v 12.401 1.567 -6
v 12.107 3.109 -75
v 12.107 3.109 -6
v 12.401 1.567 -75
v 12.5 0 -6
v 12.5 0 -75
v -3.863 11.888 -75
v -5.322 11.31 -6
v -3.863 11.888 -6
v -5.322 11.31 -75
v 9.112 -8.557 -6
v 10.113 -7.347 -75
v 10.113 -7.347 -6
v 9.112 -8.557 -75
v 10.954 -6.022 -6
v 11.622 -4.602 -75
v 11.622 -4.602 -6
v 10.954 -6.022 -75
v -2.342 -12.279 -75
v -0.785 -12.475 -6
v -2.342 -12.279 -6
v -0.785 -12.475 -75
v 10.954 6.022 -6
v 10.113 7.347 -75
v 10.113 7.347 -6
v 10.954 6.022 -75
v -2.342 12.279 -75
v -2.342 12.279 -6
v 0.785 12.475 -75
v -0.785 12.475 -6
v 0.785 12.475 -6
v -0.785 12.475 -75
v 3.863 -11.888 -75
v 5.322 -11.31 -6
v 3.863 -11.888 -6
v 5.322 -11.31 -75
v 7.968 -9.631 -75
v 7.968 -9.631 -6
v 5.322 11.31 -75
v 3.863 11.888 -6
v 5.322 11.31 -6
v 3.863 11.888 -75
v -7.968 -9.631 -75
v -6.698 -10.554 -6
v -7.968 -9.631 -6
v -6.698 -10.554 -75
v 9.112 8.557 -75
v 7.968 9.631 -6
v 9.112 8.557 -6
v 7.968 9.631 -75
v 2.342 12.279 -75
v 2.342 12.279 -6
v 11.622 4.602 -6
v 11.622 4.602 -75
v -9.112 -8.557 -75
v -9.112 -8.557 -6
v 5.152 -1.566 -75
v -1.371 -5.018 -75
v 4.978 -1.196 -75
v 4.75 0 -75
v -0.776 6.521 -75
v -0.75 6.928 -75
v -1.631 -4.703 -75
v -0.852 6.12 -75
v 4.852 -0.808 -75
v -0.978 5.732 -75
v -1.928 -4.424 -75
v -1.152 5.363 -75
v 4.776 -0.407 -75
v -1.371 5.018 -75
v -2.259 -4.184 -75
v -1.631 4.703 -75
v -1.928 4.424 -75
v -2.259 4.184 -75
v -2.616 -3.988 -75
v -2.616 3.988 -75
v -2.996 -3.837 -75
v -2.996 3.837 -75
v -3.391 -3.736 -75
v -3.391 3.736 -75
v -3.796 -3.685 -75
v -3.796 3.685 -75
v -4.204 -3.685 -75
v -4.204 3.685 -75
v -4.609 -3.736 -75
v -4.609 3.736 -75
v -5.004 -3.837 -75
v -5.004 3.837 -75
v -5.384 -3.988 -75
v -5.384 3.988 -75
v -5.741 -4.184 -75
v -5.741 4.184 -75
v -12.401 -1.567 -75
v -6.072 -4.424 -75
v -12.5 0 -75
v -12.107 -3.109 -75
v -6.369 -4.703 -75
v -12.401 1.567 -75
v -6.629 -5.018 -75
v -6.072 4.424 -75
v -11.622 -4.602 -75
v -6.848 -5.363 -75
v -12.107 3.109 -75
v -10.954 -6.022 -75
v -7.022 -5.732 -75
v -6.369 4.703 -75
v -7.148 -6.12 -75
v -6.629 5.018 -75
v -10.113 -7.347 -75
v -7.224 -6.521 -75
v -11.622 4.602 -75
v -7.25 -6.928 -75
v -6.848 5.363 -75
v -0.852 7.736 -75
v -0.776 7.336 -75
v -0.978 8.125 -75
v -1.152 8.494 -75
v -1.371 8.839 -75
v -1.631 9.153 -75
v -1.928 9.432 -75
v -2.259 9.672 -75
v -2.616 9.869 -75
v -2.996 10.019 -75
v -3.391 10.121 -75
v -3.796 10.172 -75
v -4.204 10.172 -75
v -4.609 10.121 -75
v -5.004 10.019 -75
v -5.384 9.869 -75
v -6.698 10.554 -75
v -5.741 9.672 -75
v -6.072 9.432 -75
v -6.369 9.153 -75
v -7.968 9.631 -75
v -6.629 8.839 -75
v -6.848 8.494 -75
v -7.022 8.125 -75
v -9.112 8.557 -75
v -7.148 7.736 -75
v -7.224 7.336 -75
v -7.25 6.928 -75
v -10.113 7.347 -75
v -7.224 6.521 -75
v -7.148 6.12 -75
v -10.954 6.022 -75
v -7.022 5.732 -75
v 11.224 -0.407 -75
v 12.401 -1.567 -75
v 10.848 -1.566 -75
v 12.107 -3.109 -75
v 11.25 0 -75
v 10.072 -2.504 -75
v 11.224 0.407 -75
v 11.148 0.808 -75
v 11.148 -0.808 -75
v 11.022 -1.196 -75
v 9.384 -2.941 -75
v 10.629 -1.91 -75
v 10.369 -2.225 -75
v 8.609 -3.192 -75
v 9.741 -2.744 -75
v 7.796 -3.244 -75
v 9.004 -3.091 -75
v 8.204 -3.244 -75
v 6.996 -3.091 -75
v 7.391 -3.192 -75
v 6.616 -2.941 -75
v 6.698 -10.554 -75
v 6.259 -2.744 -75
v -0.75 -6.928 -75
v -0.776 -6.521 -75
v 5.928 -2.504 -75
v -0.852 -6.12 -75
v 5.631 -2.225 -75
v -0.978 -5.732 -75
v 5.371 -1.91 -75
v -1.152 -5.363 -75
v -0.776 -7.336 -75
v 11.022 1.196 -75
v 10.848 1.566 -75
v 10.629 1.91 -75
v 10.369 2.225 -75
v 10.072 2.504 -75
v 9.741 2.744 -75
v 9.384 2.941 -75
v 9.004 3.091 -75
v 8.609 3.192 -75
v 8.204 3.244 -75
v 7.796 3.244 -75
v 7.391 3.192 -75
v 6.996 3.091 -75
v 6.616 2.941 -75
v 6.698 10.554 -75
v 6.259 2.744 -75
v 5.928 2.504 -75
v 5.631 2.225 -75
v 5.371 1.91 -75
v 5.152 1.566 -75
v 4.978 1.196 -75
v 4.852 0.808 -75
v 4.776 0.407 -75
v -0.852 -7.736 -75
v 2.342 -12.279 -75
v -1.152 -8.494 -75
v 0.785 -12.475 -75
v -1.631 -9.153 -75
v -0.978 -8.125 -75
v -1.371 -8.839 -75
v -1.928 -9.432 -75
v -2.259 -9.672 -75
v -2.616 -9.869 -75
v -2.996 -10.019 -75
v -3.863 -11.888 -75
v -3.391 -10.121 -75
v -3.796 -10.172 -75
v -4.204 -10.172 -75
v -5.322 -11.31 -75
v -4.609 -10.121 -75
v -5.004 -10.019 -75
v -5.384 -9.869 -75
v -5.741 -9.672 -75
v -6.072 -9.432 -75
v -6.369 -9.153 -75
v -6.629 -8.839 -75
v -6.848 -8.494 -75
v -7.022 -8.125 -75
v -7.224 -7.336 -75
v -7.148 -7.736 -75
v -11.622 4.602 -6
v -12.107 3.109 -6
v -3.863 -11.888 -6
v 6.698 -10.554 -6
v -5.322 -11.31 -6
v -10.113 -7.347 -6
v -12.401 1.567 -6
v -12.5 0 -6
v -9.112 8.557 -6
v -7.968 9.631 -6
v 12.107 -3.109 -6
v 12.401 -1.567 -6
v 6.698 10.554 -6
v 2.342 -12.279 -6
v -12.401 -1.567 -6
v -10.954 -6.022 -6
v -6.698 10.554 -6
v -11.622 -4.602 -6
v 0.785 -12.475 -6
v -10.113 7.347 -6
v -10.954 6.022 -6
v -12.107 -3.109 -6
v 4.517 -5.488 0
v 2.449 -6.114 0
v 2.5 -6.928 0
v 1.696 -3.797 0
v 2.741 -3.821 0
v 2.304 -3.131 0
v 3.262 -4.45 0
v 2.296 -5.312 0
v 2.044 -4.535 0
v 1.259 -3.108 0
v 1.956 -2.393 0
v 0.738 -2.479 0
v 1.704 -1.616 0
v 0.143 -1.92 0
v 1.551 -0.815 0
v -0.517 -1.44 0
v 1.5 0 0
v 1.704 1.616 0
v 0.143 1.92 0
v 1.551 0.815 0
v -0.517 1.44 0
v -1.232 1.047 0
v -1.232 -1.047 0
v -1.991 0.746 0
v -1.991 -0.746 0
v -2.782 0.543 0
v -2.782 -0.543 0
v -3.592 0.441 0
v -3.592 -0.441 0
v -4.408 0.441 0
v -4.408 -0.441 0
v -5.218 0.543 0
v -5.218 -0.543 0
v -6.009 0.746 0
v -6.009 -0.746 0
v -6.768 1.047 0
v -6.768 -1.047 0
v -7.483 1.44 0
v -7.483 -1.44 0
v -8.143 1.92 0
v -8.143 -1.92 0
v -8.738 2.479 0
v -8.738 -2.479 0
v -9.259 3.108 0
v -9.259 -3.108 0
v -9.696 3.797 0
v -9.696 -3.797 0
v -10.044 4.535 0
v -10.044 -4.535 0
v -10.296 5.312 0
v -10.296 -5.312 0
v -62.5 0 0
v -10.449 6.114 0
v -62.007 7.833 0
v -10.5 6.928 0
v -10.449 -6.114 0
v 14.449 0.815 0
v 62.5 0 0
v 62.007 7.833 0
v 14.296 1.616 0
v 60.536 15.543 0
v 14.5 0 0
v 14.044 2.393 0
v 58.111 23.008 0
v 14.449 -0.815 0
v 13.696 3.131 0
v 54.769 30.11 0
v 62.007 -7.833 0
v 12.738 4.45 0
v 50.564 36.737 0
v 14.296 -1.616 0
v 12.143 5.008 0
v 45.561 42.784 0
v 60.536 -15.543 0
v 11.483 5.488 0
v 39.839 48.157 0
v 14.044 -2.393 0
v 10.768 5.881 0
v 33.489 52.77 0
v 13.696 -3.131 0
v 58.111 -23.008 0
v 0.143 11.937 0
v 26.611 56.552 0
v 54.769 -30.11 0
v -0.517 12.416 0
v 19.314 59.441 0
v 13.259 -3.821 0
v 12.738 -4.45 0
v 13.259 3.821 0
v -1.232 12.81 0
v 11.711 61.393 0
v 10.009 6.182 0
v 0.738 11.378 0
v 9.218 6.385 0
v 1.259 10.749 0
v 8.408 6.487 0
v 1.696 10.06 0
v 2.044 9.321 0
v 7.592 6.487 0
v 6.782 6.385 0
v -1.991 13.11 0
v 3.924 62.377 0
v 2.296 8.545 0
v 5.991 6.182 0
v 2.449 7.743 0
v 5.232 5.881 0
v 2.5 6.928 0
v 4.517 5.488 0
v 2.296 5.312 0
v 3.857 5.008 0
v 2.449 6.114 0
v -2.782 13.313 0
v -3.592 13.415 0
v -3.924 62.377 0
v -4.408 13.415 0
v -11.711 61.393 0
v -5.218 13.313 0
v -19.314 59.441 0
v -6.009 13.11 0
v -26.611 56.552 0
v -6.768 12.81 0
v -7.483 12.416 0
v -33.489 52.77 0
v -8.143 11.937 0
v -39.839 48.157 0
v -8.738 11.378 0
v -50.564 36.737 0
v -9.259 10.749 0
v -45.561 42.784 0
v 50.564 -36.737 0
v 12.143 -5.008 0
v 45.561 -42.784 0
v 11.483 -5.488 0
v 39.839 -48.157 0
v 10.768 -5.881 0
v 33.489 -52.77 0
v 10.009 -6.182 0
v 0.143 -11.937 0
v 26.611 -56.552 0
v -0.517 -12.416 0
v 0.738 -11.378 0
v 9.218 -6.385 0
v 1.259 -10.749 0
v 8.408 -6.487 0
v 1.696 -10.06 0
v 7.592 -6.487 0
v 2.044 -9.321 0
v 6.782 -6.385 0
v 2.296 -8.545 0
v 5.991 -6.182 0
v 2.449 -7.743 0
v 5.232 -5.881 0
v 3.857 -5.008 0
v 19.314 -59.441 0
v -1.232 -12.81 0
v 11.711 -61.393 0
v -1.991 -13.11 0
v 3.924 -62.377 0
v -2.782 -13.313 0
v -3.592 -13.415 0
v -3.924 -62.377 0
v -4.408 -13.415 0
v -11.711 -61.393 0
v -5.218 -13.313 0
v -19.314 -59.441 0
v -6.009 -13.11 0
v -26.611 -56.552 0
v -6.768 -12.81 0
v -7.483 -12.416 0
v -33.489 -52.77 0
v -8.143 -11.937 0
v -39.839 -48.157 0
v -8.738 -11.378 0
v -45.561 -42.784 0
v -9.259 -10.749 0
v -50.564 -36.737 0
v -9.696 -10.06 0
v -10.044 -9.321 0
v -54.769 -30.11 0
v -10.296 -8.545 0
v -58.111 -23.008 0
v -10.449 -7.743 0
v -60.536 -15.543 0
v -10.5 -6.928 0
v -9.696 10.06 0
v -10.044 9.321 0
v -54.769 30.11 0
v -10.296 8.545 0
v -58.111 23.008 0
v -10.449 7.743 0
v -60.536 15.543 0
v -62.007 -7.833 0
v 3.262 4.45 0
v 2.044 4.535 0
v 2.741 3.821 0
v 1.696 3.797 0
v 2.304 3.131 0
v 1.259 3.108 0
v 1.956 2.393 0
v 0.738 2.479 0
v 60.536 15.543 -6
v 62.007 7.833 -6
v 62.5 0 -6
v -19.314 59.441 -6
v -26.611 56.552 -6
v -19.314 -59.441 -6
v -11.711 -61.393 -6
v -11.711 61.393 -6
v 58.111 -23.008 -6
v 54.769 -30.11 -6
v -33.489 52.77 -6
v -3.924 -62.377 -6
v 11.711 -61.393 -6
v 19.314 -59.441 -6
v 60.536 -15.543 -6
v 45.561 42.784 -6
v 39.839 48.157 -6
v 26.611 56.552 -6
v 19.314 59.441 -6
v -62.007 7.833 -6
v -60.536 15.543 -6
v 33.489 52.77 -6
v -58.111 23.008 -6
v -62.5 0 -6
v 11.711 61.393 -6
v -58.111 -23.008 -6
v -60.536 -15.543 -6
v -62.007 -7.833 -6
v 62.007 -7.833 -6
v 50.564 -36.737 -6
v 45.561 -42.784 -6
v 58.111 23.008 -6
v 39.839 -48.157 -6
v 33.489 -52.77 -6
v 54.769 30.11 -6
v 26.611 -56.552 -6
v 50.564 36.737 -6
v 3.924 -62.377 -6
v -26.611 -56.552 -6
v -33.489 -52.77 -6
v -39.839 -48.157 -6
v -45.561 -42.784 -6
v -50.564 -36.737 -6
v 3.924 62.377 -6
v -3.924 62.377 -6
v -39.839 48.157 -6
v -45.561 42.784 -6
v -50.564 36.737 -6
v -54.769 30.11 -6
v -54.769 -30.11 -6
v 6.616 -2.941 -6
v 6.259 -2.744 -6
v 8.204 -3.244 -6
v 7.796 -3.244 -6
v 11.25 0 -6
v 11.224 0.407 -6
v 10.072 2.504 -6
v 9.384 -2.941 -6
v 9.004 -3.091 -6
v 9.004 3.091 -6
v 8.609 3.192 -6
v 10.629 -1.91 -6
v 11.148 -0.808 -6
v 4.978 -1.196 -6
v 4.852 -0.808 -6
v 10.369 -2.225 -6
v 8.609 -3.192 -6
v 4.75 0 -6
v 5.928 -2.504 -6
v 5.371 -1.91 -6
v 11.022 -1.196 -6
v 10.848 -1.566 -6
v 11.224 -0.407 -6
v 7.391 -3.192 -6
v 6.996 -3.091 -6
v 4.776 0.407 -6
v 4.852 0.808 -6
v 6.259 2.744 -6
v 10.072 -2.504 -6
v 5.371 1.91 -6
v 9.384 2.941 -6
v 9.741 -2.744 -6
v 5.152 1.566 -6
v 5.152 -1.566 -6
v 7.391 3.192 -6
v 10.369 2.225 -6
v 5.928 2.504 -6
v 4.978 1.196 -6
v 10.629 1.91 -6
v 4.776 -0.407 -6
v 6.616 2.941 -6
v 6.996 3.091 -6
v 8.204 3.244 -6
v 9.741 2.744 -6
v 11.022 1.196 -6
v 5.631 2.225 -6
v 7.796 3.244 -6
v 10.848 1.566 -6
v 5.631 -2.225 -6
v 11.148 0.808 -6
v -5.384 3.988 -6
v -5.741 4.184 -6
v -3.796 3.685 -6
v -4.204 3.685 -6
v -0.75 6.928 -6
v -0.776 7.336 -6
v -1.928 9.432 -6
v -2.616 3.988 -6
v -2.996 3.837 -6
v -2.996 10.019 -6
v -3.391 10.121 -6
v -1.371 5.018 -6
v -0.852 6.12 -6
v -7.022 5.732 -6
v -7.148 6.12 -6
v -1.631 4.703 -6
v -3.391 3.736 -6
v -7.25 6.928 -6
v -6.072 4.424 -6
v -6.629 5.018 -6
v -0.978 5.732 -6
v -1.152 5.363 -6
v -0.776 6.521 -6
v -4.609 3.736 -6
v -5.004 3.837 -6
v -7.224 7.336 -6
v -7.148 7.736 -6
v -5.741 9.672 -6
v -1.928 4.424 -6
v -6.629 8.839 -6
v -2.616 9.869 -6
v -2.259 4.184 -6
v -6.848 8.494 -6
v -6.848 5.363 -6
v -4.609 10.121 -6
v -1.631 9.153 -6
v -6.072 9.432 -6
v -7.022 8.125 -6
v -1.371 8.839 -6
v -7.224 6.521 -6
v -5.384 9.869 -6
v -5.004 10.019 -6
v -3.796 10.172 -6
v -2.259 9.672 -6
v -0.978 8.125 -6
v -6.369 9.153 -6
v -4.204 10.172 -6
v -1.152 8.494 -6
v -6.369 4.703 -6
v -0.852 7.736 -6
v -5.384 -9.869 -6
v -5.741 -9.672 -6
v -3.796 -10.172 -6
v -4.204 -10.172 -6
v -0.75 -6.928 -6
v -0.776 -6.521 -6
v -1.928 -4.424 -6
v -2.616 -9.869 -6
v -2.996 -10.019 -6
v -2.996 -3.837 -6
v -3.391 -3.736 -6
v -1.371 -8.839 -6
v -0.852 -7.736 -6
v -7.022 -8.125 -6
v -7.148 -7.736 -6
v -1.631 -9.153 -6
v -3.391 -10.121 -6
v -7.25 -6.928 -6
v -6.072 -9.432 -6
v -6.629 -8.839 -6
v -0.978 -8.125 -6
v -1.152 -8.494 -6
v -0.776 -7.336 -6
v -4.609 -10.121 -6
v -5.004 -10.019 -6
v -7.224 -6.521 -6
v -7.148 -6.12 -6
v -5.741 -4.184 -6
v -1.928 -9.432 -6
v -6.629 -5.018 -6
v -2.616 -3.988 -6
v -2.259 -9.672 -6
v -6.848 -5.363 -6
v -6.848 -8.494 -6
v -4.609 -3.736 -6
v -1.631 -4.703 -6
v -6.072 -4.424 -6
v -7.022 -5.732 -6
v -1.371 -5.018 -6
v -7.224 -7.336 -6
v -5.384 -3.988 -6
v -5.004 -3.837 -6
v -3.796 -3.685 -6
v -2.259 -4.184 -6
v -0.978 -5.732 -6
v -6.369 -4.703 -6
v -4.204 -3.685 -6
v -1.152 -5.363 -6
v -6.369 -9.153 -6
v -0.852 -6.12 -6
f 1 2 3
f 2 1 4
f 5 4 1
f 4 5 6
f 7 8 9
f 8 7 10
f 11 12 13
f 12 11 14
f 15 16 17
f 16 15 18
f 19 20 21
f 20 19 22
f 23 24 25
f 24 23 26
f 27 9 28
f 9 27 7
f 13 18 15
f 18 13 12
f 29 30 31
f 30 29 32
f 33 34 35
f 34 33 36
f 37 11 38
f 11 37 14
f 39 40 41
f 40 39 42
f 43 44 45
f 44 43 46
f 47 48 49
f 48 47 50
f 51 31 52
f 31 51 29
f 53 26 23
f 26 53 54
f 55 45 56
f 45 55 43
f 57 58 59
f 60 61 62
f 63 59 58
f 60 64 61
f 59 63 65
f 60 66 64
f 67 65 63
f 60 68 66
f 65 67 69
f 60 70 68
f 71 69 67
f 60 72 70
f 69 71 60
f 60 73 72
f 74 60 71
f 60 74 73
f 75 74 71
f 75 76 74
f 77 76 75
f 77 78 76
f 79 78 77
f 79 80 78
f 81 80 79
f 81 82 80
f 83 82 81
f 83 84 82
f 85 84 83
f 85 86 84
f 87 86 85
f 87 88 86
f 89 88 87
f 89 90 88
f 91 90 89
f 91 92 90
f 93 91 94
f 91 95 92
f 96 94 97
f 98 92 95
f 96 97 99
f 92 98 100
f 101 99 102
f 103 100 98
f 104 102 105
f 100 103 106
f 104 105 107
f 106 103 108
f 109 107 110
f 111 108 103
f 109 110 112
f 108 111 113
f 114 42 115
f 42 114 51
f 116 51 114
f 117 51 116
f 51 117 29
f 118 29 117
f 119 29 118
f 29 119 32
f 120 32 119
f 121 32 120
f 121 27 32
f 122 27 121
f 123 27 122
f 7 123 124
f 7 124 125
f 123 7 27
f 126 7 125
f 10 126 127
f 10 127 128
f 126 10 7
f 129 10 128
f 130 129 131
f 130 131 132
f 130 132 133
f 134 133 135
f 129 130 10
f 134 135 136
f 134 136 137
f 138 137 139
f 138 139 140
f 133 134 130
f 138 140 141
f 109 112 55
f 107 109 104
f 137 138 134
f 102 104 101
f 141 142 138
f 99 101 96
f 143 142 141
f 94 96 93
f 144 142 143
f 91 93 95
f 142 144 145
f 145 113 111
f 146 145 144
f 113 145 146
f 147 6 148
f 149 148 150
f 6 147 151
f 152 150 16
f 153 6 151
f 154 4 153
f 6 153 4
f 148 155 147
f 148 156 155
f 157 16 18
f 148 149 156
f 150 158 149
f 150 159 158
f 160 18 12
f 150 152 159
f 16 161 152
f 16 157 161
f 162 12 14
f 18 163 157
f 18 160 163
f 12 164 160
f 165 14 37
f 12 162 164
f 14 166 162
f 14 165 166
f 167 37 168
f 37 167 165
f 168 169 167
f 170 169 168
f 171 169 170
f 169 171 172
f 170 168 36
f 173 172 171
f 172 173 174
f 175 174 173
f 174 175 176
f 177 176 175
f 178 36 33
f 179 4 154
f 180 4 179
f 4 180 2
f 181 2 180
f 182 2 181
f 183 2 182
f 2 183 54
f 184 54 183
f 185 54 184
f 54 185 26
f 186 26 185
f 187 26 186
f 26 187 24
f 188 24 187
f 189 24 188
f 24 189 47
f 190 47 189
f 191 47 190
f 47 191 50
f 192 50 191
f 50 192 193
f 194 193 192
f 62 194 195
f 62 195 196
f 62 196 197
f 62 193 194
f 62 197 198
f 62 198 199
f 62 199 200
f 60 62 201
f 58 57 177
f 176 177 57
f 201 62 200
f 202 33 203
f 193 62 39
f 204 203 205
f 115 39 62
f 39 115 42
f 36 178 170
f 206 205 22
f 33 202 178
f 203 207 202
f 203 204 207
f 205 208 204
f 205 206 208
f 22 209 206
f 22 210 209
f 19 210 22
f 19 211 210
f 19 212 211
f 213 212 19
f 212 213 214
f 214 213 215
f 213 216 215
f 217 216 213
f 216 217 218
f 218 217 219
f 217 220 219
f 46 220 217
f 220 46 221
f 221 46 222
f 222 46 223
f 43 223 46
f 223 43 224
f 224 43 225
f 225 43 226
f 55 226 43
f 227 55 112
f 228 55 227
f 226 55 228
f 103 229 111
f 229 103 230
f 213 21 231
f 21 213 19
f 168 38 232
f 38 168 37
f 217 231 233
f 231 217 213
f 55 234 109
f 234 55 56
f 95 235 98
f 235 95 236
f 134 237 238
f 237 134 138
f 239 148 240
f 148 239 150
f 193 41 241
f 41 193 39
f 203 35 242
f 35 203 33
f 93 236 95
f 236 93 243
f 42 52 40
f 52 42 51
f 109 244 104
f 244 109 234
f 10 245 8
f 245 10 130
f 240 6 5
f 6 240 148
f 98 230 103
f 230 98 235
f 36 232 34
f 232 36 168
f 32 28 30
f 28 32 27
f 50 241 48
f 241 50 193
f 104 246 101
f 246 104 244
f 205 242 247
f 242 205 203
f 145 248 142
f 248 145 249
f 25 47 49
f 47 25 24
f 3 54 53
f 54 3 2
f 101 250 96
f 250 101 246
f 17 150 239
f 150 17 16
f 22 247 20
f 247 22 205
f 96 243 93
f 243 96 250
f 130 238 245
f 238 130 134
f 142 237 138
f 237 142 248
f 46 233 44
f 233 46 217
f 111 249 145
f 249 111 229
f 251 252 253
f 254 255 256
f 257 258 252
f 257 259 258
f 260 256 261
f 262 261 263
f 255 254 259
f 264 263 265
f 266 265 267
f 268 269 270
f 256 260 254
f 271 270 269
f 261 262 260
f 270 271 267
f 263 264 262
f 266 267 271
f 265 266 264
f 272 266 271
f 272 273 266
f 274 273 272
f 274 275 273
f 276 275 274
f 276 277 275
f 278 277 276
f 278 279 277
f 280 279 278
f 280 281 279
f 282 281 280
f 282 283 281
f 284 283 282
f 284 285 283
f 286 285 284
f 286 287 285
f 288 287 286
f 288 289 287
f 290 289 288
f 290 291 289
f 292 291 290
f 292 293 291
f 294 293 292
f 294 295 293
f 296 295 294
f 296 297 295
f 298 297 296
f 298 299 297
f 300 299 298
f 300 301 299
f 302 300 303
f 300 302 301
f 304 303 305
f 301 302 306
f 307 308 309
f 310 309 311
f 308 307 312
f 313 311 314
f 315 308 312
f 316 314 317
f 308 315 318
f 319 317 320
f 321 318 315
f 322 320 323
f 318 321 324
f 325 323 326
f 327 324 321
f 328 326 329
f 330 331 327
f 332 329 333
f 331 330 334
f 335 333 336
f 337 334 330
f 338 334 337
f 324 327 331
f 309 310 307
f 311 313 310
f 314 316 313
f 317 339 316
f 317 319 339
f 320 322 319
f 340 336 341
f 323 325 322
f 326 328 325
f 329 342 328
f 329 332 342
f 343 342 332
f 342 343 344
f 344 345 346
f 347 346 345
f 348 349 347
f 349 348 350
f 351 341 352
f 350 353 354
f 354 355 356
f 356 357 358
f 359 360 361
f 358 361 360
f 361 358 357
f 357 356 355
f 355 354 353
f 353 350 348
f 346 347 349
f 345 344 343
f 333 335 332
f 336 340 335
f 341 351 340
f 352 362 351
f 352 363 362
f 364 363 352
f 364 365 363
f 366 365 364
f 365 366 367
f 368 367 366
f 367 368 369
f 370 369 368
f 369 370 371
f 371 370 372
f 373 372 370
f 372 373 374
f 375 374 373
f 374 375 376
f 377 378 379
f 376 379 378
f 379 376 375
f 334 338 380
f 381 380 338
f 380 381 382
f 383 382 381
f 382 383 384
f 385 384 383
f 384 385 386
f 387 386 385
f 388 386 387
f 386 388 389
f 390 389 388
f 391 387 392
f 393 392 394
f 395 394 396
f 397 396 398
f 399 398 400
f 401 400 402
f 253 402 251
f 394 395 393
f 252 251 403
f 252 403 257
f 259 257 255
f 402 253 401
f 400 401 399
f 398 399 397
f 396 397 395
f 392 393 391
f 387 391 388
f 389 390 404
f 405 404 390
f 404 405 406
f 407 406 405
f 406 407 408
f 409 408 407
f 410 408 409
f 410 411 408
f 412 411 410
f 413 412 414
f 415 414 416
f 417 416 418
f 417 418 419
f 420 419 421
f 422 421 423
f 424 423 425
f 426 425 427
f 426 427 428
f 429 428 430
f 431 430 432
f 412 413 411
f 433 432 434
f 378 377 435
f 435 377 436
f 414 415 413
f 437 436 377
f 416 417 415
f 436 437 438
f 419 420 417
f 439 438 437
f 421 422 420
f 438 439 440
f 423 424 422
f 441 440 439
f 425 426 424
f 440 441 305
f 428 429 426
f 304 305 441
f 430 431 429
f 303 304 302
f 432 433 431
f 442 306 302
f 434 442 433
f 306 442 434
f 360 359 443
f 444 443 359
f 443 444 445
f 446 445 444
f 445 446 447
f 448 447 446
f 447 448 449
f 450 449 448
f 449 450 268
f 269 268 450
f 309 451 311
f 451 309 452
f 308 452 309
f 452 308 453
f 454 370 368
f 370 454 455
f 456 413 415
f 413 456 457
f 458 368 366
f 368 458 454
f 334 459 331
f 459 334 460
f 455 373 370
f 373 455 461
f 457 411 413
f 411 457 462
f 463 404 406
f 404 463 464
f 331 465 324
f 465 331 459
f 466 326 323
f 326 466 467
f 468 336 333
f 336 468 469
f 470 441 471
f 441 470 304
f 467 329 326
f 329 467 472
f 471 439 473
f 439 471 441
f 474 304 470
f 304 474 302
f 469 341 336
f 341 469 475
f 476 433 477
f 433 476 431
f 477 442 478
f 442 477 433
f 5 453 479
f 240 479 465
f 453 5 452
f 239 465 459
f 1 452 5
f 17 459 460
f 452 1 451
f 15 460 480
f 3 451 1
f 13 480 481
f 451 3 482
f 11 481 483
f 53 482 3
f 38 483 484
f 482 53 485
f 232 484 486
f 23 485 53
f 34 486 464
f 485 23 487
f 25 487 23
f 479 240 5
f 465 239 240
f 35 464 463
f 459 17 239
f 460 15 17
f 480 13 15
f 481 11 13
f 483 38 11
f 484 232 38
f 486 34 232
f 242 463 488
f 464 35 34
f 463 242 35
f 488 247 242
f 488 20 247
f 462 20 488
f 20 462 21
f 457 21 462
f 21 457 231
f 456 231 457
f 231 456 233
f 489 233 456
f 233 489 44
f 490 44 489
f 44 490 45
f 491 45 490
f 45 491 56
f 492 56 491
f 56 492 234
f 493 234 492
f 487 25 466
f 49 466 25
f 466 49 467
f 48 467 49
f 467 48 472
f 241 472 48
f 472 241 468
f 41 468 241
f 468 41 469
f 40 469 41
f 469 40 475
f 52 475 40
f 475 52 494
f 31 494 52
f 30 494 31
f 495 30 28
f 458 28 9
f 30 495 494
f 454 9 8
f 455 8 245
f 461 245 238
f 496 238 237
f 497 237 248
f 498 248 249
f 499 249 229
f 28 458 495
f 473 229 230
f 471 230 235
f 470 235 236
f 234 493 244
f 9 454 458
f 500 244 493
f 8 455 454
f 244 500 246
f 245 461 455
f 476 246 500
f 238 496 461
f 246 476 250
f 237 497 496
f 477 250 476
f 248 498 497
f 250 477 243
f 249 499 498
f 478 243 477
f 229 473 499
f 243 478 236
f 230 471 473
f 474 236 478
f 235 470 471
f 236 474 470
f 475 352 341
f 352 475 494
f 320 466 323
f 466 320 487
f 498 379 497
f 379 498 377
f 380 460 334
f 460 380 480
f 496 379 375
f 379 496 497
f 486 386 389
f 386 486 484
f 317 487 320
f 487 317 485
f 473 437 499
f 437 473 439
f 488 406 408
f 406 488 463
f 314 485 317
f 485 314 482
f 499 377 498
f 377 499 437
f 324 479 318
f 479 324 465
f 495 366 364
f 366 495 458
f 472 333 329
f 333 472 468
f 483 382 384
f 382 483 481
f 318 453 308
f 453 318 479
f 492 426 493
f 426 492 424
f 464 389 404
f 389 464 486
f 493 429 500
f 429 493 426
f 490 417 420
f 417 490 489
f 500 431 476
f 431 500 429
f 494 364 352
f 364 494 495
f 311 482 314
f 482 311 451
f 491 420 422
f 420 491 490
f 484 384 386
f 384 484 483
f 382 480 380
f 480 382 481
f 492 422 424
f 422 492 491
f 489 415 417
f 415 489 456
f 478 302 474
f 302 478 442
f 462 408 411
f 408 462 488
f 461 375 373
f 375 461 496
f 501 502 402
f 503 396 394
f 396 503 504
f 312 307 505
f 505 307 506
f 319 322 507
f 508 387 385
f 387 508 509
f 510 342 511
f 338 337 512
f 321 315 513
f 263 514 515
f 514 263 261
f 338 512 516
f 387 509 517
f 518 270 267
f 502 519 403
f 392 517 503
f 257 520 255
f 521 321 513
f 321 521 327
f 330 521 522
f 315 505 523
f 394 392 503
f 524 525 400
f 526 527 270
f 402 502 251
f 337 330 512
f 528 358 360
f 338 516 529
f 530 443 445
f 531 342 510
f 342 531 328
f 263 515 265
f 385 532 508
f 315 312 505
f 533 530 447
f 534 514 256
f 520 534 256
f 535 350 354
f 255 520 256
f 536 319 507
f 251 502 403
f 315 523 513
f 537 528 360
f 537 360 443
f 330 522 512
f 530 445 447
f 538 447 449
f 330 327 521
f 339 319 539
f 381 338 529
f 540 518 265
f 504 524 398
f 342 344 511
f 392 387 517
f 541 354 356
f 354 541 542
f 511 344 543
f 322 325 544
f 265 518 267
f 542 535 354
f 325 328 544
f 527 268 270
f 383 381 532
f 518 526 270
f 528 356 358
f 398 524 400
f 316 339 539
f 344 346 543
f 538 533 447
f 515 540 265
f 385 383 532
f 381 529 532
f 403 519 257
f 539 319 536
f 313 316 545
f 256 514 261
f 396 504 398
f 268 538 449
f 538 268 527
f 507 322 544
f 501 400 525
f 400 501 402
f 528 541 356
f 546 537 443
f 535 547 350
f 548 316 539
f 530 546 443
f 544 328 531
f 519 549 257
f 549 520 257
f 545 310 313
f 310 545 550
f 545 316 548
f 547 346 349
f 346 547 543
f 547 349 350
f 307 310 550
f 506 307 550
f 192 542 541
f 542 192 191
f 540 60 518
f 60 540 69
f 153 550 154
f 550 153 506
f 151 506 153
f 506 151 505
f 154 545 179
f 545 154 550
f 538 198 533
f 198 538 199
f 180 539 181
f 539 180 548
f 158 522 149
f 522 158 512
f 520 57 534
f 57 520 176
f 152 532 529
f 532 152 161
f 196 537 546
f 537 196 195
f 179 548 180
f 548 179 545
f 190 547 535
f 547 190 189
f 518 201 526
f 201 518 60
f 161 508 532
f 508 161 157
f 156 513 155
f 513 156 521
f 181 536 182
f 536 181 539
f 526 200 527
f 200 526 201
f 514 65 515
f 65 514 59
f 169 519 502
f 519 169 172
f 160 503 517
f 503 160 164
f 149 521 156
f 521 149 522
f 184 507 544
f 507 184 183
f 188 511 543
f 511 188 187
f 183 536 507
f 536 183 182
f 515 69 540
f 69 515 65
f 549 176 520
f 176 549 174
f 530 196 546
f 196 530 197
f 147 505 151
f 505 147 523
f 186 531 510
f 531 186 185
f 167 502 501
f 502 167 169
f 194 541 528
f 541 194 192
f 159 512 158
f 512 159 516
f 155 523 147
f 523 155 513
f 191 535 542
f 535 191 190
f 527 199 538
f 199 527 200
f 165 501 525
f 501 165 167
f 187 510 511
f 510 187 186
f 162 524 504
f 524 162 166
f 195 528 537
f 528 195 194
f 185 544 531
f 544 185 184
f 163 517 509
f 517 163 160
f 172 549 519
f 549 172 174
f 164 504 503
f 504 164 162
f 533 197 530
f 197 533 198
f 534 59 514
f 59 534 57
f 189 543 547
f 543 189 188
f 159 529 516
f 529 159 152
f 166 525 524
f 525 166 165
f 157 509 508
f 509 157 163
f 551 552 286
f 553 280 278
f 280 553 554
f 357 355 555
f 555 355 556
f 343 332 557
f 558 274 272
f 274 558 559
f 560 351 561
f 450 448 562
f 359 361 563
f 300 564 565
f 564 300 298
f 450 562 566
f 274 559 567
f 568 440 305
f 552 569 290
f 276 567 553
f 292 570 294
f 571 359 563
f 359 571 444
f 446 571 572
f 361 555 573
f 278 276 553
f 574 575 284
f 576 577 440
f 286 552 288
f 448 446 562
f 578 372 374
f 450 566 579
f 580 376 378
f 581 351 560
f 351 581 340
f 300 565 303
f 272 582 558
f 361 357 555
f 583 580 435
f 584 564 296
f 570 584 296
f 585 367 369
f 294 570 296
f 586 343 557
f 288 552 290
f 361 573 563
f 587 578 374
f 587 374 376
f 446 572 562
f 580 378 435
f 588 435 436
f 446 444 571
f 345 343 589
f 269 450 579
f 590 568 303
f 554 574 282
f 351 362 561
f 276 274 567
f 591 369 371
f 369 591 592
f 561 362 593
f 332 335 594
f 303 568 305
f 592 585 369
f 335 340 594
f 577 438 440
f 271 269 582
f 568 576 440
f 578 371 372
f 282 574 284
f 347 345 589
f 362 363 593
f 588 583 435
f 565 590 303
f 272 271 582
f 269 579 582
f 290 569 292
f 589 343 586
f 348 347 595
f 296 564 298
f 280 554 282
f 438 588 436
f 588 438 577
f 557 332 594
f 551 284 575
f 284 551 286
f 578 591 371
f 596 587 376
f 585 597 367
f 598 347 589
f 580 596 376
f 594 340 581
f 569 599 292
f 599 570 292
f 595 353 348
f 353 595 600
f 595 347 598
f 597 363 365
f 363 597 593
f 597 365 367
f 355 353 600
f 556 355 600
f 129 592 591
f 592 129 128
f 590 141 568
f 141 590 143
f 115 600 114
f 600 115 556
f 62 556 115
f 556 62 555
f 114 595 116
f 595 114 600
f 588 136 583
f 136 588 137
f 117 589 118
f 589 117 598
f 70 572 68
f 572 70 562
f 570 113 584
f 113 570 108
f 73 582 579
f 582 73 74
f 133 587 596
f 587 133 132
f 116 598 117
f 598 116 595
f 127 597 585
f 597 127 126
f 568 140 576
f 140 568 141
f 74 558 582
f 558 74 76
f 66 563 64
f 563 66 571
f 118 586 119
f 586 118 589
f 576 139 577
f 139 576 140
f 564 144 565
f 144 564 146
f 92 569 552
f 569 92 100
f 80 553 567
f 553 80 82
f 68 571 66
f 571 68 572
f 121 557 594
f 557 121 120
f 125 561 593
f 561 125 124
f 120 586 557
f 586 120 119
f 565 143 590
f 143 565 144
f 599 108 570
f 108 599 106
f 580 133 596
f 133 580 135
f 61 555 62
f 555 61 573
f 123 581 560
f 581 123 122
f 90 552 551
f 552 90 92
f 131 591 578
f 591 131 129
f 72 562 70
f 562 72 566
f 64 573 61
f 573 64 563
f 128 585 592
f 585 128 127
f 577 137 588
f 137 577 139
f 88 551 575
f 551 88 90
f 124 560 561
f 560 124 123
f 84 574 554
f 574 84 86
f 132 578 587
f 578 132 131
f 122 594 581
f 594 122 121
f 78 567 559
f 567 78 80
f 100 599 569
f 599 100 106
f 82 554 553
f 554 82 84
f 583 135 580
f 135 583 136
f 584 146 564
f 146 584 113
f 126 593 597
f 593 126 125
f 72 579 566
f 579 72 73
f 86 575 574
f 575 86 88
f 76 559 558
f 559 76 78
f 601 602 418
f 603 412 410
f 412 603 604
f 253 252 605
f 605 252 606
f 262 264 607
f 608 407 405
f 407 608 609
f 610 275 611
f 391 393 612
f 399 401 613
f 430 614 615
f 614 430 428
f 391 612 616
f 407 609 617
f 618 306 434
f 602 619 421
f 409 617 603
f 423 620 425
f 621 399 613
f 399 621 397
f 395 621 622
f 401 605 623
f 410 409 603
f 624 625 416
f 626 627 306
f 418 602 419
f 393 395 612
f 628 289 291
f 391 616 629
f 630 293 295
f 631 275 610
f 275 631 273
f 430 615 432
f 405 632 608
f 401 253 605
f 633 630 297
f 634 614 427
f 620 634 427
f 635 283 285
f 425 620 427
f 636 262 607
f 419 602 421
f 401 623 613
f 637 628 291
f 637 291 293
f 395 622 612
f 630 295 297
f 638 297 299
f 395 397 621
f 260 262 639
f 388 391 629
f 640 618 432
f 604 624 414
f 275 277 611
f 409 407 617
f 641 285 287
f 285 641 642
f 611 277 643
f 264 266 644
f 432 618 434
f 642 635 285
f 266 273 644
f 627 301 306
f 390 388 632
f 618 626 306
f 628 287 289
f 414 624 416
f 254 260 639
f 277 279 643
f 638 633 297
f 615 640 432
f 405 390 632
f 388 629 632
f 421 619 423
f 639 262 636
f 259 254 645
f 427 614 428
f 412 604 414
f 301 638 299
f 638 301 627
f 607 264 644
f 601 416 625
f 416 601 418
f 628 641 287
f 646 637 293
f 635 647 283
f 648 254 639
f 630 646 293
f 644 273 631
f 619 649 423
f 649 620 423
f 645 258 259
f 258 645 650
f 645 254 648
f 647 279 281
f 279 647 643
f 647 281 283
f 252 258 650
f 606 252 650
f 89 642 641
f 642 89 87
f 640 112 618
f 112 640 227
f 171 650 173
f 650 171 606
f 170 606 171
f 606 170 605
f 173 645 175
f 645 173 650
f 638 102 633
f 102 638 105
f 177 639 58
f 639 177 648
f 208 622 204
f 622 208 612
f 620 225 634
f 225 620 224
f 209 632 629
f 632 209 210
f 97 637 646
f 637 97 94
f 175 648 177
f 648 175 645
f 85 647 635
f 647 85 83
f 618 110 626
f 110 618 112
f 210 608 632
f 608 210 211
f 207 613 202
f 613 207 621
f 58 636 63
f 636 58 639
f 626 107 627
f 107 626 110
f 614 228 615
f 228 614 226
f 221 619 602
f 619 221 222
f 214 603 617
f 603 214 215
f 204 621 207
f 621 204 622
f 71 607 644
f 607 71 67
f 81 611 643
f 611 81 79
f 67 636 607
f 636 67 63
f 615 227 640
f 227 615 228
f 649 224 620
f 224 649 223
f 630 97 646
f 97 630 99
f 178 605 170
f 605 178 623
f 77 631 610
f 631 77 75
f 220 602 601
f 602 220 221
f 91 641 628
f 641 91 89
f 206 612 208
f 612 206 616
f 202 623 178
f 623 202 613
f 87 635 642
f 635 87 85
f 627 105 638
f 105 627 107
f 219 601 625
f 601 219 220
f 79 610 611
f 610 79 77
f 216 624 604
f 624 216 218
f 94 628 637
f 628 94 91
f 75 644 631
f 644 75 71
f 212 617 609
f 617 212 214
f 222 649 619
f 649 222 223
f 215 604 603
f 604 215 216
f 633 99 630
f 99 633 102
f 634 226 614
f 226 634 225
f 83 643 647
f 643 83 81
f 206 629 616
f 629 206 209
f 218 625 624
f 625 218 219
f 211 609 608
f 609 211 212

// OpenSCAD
$fn = 50;


difference() {
	union() {
		translate(v = [0, 0, -75.0000000000]) {
			cylinder(h = 75, r = 12.5000000000);
		}
		translate(v = [0, 0, -6.0000000000]) {
			cylinder(h = 6, r = 62.5000000000);
		}
	}
	union() {
		translate(v = [8.0000000000, 0.0000000000, 0]) {
			rotate(a = [0, 0, 0]) {
				difference() {
					union() {
						#translate(v = [0, 0, -75.0000000000]) {
							cylinder(h = 75, r = 2.2500000000);
						}
						#translate(v = [0, 0, -6]) {
							cylinder(h = 6, r = 12.5000000000, r1 = 3.2500000000, r2 = 6.5000000000);
						}
						#translate(v = [0, 0, -75.0000000000]) {
							cylinder(h = 75, r = 3.2500000000);
						}
						#translate(v = [0, 0, -75.0000000000]) {
							cylinder(h = 75, r = 2.2500000000);
						}
					}
					union();
				}
			}
		}
		translate(v = [-4.0000000000, 6.9282032303, 0]) {
			rotate(a = [0, 0, 0]) {
				difference() {
					union() {
						#translate(v = [0, 0, -75.0000000000]) {
							cylinder(h = 75, r = 2.2500000000);
						}
						#translate(v = [0, 0, -6]) {
							cylinder(h = 6, r = 12.5000000000, r1 = 3.2500000000, r2 = 6.5000000000);
						}
						#translate(v = [0, 0, -75.0000000000]) {
							cylinder(h = 75, r = 3.2500000000);
						}
						#translate(v = [0, 0, -75.0000000000]) {
							cylinder(h = 75, r = 2.2500000000);
						}
					}
					union();
				}
			}
		}
		translate(v = [-4.0000000000, -6.9282032303, 0]) {
			rotate(a = [0, 0, 0]) {
				difference() {
					union() {
						#translate(v = [0, 0, -75.0000000000]) {
							cylinder(h = 75, r = 2.2500000000);
						}
						#translate(v = [0, 0, -6]) {
							cylinder(h = 6, r = 12.5000000000, r1 = 3.2500000000, r2 = 6.5000000000);
						}
						#translate(v = [0, 0, -75.0000000000]) {
							cylinder(h = 75, r = 3.2500000000);
						}
						#translate(v = [0, 0, -75.0000000000]) {
							cylinder(h = 75, r = 2.2500000000);
						}
					}
					union();
				}
			}
		}
	}
}
